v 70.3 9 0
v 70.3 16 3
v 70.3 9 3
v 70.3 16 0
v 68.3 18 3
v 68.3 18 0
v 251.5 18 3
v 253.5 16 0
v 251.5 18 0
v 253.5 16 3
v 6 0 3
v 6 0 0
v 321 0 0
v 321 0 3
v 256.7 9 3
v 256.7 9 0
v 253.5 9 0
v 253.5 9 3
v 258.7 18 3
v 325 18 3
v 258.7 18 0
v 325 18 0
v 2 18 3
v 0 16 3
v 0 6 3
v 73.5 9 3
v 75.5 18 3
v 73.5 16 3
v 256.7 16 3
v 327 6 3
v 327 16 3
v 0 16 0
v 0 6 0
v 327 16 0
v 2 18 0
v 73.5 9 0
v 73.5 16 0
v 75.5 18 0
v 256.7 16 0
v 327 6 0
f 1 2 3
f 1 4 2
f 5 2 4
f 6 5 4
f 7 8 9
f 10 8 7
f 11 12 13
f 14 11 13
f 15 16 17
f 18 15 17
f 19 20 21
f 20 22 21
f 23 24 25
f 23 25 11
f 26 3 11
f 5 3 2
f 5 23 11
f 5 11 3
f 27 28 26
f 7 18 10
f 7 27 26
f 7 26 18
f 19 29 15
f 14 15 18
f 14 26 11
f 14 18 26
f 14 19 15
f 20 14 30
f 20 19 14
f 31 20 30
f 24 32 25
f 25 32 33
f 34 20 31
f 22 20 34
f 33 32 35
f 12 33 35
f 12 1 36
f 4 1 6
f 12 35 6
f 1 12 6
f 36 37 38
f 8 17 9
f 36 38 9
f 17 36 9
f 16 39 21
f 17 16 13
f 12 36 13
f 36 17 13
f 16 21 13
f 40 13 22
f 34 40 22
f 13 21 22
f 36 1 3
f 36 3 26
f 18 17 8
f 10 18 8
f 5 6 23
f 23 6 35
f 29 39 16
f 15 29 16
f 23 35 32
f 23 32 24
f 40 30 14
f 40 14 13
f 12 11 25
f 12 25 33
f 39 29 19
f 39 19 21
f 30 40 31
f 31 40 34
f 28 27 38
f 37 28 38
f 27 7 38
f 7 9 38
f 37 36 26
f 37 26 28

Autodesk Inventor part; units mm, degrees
ref_plane "YZ Plane" through (0, 0, 0) normal (1, 0, 0) x (0, 1, 0)
ref_plane "XZ Plane" through (0, 0, 0) normal (0, 1, 0) x (-1, 0, 0)
ref_plane "XY Plane" through (0, 0, 0) normal (0, 0, 1) x (1, 0, 0)
sketch "Sketch1" plane through (0, 0, 0) normal (0, 0, 1) x (1, 0, 0)
  line L0 (0, 0) -> (327, 0)
  line L1 (327, 0) -> (327, 18)
  line L2 (327, 18) -> (0, 18)
  line L3 (0, 18) -> (0, 0)
  line L4 (163.5, 18) -> (163.5, 0)
  line L5 (73.5, 18) -> (70.3, 18)
  line L6 (70.3, 18) -> (70.3, 9)
  line L7 (70.3, 9) -> (73.5, 9)
  line L8 (73.5, 9) -> (73.5, 18)
  line L9 (256.7, 18) -> (256.7, 9)
  line L10 (256.7, 9) -> (253.5, 9)
  line L11 (253.5, 9) -> (253.5, 18)
  dimension "d0" = 327
  dimension "d1" = 18
  dimension "d2" = 3.2
  dimension "d3" = 9
  dimension "d4" = 180
extrude "Plate1" add sketch "Sketch1" along normal blind 3 contours L3 L2 L6 L7 L8 L4 L0 | L4 L2 L11 L10 L9 L1 L0
chamfer "Corner Chamfer1" distance 6 angle 45 2 edges at (0, 0, 1.5) (327, 0, 1.5)
chamfer "Corner Chamfer2" distance 2 angle 45 6 edges at (327, 18, 1.5) (256.7, 18, 1.5) (253.5, 18, 1.5) (73.5, 18, 1.5) (70.3, 18, 1.5) (0, 18, 1.5)
equation "\"d5\" = Thickness"
equation "\"BendRadius\" = Thickness"
equation "\"BendReliefWidth\" = Thickness"
equation "\"BendReliefDepth\" = 0.5 * Thickness"
equation "\"CornerReliefSize\" = 4 * Thickness"
equation "\"MinimumRemnant\" = 2 * Thickness"
equation "\"TransitionRadius\" = BendRadius"
equation "\"JacobiRadiusSize\" = BendRadius"
equation "\"GapSize\" = Thickness"
equation "\"Thickness\" = 3"
properties part number "foot support"
